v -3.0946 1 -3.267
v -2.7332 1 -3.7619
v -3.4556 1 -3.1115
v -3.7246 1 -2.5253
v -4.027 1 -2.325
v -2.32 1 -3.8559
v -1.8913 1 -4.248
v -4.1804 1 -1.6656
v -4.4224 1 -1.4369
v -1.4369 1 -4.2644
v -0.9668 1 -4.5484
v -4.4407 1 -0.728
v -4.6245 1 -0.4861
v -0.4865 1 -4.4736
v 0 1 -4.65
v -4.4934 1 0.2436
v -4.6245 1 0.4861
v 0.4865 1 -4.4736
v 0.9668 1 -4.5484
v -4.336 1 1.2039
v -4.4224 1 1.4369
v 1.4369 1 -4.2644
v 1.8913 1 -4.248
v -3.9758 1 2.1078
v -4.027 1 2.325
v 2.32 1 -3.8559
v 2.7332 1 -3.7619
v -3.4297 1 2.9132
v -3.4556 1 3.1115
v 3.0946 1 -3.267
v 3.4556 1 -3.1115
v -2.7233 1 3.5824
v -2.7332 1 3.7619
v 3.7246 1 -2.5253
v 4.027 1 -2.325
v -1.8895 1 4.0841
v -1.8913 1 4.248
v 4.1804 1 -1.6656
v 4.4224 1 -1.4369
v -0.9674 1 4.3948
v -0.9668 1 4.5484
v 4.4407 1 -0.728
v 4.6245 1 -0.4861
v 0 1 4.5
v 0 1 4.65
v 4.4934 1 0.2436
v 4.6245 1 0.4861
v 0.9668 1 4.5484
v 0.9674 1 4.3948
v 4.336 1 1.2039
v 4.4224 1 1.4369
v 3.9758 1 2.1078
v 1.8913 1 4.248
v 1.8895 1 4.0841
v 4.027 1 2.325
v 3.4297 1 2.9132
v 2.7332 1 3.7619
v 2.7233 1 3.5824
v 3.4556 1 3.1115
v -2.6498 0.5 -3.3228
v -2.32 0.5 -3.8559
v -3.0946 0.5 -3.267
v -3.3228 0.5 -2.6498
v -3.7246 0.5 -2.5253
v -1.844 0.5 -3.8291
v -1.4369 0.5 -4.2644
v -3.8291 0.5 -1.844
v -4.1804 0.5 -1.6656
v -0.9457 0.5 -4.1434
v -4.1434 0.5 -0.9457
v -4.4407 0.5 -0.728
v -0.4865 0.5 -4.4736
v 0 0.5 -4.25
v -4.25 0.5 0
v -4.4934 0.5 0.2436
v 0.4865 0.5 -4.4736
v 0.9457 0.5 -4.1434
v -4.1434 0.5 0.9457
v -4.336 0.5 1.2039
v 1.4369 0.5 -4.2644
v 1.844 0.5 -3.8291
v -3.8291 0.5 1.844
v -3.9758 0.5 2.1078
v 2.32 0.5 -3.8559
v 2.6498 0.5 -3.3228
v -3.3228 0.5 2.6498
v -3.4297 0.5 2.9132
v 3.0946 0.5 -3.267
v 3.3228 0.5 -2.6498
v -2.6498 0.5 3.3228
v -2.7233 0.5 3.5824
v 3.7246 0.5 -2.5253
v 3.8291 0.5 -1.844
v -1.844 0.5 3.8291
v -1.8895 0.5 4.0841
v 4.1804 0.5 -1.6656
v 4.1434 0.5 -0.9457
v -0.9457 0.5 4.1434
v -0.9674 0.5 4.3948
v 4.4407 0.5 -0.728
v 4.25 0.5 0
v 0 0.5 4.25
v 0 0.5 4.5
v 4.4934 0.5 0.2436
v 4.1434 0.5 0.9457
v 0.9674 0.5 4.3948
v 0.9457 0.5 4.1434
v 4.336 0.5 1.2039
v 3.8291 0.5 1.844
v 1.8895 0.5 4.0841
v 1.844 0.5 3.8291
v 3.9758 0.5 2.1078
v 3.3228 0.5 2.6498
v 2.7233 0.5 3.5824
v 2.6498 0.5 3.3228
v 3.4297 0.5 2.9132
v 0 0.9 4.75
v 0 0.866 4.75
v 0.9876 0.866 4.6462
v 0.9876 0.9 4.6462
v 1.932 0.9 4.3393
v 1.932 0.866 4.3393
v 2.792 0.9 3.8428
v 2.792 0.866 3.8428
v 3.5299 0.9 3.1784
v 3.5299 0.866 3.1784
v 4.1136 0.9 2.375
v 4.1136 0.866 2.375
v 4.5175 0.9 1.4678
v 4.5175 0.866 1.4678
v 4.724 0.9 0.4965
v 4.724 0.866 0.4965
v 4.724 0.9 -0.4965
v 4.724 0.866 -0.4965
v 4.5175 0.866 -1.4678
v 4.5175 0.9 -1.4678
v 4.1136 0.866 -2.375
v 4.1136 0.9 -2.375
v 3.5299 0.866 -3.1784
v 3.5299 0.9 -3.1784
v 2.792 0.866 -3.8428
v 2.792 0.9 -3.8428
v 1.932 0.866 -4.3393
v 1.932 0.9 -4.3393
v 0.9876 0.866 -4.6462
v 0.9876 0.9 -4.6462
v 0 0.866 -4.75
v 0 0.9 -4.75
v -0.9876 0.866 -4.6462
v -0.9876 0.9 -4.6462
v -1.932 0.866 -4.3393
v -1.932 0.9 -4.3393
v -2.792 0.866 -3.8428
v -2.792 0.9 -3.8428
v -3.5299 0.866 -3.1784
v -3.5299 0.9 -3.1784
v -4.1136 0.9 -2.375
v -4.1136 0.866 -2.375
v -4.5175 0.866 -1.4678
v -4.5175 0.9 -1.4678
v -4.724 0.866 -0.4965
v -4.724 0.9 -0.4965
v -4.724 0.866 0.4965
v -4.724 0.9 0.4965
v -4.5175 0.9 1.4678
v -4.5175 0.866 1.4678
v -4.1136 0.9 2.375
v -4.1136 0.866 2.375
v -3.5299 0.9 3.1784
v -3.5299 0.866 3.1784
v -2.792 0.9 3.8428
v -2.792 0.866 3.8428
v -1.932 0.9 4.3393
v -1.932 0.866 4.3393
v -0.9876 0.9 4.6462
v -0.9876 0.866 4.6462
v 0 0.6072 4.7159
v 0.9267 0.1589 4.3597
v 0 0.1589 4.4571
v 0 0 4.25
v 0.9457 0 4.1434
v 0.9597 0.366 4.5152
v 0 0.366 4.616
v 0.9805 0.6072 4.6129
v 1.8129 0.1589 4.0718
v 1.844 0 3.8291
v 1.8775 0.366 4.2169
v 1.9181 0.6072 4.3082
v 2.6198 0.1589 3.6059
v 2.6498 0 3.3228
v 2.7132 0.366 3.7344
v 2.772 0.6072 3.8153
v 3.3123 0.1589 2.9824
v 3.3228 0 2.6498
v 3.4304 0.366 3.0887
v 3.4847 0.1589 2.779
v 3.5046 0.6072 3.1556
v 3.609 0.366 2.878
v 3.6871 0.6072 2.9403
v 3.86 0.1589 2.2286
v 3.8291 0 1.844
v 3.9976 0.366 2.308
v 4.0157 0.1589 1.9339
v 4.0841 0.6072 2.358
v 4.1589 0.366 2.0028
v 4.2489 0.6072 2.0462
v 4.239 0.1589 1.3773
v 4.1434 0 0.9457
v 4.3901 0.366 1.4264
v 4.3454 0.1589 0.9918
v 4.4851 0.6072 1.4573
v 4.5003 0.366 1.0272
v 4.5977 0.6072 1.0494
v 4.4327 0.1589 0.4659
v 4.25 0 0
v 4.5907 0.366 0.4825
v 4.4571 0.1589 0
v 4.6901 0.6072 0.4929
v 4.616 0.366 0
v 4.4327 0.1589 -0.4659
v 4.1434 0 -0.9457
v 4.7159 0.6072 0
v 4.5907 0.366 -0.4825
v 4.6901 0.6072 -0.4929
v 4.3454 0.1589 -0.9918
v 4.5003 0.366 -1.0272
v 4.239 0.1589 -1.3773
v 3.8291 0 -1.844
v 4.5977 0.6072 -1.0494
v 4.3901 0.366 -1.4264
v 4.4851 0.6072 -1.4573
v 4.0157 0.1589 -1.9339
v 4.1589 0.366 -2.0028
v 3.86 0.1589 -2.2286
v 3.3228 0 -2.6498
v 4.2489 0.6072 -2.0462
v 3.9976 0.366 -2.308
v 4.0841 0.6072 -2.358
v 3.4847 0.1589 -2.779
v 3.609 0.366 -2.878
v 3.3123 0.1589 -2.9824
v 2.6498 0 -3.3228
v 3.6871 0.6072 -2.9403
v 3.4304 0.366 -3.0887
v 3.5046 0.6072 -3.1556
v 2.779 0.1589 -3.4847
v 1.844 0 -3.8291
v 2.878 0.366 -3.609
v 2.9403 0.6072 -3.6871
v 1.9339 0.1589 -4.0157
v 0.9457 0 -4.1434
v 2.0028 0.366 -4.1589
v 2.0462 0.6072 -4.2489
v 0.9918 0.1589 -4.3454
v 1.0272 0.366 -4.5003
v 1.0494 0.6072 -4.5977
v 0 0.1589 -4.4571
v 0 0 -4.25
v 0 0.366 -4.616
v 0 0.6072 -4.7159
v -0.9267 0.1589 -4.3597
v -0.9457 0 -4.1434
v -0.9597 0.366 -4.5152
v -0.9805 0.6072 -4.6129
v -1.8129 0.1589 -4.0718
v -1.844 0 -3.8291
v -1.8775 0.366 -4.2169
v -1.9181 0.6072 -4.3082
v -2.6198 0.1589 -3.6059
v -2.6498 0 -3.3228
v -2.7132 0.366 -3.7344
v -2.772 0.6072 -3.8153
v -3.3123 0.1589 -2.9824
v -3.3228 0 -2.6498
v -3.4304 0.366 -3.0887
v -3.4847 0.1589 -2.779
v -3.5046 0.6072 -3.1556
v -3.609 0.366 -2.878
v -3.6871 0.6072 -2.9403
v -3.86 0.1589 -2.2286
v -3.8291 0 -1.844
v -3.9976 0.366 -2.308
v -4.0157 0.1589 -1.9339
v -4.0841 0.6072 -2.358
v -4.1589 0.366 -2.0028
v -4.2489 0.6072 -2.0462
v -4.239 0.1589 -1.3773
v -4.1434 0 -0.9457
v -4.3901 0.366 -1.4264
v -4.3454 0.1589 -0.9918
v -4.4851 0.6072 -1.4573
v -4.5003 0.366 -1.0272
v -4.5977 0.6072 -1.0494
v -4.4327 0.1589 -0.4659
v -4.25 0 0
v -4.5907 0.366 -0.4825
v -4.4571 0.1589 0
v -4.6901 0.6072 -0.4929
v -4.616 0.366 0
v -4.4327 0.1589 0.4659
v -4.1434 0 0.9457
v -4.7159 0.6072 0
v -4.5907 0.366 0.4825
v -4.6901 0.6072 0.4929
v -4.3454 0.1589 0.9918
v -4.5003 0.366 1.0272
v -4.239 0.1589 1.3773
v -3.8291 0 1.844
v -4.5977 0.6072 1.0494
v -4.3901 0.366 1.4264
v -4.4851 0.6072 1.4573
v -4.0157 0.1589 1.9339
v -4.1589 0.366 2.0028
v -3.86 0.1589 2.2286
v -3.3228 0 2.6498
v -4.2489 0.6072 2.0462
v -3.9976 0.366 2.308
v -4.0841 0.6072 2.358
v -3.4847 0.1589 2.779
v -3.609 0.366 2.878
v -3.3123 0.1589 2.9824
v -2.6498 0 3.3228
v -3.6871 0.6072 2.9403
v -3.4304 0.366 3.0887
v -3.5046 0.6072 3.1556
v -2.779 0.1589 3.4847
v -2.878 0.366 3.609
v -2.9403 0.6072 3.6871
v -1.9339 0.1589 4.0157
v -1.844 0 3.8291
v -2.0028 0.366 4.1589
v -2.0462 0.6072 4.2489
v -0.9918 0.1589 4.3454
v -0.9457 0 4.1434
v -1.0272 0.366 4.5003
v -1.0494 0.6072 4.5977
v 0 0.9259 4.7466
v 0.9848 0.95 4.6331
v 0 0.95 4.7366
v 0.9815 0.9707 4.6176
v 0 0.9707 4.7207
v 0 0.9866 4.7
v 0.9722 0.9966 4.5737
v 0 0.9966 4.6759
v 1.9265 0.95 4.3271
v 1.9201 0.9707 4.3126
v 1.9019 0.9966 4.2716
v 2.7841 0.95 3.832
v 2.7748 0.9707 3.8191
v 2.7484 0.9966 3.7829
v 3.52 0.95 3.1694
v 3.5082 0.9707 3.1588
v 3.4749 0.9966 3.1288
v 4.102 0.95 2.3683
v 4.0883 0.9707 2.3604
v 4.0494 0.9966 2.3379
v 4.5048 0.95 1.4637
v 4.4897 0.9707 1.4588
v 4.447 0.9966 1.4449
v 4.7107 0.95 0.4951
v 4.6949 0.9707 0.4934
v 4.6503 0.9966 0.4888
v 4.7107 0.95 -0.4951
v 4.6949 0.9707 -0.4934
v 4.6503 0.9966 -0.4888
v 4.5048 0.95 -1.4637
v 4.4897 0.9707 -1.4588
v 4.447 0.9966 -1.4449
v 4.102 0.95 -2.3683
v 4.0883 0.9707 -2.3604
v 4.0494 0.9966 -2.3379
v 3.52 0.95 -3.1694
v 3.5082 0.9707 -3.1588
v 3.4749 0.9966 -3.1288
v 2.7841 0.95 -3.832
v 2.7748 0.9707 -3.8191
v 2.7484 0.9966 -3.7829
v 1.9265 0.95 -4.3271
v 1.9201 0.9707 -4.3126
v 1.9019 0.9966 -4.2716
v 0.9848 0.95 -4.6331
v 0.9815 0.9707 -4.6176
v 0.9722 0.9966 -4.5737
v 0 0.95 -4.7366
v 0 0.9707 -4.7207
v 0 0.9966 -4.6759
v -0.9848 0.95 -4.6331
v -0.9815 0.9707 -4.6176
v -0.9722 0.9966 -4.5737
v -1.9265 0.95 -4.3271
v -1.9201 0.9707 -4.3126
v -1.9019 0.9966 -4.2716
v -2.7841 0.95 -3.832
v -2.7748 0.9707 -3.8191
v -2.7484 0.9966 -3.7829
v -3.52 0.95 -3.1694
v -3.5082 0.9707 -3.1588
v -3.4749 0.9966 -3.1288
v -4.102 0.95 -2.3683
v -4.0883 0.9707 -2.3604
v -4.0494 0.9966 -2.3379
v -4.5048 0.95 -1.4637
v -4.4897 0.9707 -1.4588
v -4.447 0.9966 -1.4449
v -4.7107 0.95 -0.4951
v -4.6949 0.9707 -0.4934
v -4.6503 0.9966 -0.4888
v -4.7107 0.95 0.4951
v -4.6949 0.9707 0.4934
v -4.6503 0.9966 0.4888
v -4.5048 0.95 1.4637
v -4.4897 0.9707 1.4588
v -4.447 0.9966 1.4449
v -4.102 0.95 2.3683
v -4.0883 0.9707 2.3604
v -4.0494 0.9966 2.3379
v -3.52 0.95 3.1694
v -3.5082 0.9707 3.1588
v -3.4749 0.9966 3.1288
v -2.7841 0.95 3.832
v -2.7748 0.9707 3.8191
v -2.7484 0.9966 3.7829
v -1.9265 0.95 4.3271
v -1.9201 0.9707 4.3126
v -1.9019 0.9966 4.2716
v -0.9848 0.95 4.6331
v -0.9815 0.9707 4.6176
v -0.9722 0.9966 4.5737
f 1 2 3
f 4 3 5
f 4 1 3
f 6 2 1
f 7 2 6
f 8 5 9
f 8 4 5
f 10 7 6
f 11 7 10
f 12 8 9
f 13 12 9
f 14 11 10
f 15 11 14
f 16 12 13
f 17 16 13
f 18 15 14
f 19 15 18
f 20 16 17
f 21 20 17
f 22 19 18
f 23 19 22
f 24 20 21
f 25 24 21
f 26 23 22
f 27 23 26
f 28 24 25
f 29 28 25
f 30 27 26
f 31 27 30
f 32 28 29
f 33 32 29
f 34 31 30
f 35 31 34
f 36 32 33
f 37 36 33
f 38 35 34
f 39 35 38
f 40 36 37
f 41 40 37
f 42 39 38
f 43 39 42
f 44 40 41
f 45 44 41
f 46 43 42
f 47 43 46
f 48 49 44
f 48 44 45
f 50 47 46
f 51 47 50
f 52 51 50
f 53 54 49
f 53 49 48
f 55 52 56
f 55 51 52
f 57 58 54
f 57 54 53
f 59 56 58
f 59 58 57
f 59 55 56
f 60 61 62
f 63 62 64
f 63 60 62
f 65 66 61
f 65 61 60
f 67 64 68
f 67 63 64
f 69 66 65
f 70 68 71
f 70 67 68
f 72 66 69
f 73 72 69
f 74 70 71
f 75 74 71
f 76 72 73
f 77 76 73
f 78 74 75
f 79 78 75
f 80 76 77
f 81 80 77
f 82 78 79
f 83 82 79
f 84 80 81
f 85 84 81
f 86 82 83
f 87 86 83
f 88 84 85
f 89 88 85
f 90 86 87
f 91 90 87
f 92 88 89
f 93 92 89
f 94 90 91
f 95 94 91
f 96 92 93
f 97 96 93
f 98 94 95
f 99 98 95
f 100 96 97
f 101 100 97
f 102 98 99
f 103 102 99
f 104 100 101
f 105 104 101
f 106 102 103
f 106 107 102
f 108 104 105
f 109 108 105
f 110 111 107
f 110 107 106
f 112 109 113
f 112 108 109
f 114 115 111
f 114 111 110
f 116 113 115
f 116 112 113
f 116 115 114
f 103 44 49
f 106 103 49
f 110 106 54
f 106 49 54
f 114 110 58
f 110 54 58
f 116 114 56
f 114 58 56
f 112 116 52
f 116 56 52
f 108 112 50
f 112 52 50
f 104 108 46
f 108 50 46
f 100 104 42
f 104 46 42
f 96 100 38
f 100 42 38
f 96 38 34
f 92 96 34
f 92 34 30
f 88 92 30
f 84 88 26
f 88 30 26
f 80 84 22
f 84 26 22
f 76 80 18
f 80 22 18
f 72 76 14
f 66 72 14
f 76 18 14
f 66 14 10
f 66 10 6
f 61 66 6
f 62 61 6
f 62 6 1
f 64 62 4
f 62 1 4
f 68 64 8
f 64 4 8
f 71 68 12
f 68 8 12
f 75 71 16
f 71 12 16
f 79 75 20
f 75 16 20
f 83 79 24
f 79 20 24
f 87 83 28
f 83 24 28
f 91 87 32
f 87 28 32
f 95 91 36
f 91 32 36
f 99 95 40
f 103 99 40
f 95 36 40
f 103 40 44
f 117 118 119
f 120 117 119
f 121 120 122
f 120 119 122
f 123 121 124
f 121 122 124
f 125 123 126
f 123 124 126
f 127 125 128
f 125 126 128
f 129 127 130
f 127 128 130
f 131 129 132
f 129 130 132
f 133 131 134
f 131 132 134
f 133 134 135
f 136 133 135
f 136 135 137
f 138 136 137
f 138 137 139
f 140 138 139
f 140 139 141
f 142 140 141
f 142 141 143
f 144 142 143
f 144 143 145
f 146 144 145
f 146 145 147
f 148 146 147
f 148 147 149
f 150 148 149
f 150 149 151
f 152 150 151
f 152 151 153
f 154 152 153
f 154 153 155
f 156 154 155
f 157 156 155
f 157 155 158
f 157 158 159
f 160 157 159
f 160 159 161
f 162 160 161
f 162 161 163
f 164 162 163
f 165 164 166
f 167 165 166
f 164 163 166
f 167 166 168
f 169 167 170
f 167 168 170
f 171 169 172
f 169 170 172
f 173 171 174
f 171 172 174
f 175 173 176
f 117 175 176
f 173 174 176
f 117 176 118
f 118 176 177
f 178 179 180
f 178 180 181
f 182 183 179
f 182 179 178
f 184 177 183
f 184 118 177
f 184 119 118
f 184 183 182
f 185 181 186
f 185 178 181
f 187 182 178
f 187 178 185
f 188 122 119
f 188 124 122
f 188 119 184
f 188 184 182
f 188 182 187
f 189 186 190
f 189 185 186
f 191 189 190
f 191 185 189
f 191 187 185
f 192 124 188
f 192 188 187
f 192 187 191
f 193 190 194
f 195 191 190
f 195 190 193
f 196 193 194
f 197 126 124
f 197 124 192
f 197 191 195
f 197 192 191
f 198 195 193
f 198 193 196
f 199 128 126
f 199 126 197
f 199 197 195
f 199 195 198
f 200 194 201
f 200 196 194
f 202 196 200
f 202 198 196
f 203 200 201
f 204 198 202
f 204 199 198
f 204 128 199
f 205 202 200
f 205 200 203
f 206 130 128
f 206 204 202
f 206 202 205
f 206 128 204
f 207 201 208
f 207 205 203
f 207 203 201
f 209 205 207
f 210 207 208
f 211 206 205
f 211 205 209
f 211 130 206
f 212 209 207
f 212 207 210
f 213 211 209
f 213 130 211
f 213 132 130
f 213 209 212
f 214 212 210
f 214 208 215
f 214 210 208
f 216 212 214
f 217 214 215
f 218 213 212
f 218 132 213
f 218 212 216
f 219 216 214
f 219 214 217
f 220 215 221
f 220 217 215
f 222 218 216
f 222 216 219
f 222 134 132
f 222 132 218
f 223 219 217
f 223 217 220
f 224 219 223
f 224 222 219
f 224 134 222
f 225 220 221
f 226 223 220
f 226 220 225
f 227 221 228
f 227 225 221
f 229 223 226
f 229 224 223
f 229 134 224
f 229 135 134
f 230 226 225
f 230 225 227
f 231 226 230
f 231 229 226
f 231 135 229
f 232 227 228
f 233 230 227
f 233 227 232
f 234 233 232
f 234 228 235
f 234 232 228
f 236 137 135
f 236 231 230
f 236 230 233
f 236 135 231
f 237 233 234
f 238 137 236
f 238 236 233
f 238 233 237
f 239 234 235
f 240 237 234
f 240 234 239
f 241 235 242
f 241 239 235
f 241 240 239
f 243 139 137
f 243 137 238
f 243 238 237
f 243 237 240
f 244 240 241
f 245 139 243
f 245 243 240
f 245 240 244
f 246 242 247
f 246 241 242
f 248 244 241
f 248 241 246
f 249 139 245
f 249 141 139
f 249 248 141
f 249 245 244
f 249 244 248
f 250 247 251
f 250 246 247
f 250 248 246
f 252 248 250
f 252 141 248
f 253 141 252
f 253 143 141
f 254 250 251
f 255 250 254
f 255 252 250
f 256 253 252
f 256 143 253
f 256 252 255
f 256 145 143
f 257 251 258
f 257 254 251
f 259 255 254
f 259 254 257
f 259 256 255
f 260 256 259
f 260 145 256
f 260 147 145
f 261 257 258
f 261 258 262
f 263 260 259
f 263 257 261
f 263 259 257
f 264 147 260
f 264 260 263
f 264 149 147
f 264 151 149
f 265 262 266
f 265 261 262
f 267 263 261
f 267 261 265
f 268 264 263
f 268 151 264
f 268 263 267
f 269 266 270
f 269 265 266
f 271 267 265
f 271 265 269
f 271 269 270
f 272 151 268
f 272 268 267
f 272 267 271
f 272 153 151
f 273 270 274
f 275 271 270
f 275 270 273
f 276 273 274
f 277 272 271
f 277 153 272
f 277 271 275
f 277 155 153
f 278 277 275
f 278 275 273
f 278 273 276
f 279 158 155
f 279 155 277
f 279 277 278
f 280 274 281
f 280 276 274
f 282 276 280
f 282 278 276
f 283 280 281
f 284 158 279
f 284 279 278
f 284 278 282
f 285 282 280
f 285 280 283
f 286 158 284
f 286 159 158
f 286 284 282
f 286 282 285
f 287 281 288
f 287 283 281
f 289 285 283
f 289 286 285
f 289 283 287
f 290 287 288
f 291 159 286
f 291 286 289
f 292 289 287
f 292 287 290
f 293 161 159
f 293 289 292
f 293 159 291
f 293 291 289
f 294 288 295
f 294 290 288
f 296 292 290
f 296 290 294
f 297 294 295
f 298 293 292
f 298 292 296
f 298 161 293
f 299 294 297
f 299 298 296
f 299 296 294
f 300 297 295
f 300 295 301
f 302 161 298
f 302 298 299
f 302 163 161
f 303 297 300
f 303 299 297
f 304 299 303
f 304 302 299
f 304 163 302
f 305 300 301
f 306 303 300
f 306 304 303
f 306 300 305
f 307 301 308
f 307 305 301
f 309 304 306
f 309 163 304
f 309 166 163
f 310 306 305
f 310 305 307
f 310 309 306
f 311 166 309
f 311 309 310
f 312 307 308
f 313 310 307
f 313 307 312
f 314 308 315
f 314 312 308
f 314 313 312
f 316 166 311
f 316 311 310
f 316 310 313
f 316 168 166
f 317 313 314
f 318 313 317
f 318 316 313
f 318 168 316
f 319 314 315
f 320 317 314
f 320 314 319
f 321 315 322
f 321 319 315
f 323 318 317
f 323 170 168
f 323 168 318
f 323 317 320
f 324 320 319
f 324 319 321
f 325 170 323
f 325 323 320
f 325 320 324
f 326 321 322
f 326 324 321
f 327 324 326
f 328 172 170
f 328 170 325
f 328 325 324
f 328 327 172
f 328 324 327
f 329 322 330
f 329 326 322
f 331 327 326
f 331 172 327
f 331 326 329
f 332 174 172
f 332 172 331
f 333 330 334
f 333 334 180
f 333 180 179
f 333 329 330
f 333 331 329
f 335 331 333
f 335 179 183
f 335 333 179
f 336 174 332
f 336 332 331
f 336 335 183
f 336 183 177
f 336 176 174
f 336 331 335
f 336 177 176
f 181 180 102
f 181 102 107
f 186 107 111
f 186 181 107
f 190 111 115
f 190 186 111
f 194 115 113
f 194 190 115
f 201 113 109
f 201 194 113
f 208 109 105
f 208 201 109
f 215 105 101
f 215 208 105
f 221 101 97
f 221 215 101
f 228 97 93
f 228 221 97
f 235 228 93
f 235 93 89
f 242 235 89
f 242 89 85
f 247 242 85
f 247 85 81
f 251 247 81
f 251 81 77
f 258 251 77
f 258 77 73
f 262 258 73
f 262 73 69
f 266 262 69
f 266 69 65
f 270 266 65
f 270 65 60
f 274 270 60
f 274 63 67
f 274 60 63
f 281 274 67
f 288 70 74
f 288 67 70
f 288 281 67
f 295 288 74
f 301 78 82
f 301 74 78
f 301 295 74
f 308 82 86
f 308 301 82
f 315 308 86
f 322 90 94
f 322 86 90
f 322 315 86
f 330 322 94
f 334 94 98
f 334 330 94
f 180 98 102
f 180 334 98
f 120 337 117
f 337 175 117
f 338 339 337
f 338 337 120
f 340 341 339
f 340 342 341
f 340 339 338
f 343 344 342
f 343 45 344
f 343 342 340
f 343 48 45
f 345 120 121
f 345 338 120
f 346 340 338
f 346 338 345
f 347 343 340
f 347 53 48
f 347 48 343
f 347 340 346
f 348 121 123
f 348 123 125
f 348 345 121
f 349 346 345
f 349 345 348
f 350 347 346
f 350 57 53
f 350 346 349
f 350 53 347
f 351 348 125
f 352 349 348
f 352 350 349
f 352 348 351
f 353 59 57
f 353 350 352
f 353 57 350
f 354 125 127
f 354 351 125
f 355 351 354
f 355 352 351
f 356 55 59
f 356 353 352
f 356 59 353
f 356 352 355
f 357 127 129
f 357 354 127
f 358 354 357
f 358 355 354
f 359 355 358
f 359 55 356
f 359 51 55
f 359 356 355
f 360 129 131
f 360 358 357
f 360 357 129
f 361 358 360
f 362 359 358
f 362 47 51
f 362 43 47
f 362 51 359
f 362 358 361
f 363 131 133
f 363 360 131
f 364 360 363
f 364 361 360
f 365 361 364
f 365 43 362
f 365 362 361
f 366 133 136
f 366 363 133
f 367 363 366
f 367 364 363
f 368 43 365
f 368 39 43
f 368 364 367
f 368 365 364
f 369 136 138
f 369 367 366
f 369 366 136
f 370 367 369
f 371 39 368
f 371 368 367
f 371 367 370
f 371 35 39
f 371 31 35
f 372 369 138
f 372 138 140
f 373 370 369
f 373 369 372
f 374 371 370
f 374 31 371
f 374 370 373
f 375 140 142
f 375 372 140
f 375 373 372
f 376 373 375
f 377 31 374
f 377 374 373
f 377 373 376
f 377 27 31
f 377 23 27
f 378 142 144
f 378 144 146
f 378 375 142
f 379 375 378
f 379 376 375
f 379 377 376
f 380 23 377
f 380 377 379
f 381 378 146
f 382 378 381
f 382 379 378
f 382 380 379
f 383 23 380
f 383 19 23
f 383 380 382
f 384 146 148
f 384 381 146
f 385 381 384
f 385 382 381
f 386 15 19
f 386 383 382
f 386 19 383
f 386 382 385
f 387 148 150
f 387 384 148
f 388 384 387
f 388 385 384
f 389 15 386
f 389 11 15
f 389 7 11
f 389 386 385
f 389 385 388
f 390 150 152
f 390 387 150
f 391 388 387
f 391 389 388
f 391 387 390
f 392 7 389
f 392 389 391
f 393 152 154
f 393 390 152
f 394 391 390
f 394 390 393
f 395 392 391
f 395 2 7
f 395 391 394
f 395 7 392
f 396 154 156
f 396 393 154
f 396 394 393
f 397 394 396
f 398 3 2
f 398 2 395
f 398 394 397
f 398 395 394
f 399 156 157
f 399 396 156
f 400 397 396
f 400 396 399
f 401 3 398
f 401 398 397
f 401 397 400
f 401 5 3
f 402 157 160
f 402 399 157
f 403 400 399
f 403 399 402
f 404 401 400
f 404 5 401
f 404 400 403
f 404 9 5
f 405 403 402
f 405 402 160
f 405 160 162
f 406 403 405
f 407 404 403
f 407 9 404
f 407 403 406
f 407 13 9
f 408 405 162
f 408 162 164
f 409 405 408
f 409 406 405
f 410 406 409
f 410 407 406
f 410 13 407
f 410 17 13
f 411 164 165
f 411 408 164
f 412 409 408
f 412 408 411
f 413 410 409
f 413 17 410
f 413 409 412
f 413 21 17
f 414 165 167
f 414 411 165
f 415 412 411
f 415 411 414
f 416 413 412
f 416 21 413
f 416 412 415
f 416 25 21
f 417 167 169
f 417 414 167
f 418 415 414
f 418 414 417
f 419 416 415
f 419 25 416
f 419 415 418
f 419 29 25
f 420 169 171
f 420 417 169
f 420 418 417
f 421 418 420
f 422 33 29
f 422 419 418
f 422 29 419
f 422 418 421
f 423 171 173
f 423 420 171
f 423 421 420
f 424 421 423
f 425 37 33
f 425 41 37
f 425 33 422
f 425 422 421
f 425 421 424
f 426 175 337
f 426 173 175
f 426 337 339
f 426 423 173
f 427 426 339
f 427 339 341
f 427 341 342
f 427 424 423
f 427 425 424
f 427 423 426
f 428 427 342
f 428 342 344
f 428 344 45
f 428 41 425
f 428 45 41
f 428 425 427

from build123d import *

# Parameters (mm, degrees)
SKETCH1_R           = 4.75
SKETCH1_R_2         = 4.25
BOSS_EXTRUDE1_DEPTH = 1
SKETCH2_R           = 4.5
CUT_EXTRUDE1_DEPTH  = 0.5
FILLET1_R           = 1
FILLET2_R           = 0.1


with BuildPart() as part:
    # Sketch1 → Boss-Extrude1 (new body)
    with BuildSketch(Plane(origin=(0, 0, 0), x_dir=(1, 0, 0), z_dir=(0, 1, 0))):
        with Locations(Location((0, 0, 0), (0, 0, 270))):
            Circle(SKETCH1_R)
        with Locations(Location((0, 0, 0), (0, 0, 270))):
            Circle(SKETCH1_R_2, mode=Mode.SUBTRACT)
    extrude(amount=BOSS_EXTRUDE1_DEPTH)

    # Sketch2 → Cut-Extrude1 (cut)
    with BuildSketch(Plane(origin=(0, 1, 0), x_dir=(1, 0, 0), z_dir=(0, 1, 0))):
        with Locations(Location((0, 0, 0), (0, 0, 270))):
            Circle(SKETCH2_R)
    extrude(amount=-CUT_EXTRUDE1_DEPTH, mode=Mode.SUBTRACT)

    # Fillet1
    # the kernel refuses this fillet: 1 mm, written as the material it takes off along each edge
    with BuildSketch(Plane(origin=(0, 0, 0), x_dir=(0, 0, 1), z_dir=(-1, 0, 0))) as fillet1_piece_1:
        with BuildLine():
            CenterArc((3.75, 0.866025404), FILLET1_R, 300, 60)
            Line((4.25, 0), (4.26, -0.017320508))
            ThreePointArc((4.26, -0.017320508), (4.5, -0.02), (4.75, -0.02))
            Line((4.75, -0.02), (4.77, 0))
            Line((4.77, 0), (4.77, 0.866025404))
            Line((4.77, 0.866025404), (4.75, 0.866025404))
        make_face()
    revolve(axis=Axis((0, 0, 0), (0, 1, 0)), mode=Mode.SUBTRACT)

    # Fillet2
    fillet2_edges = [part.edges().sort_by_distance(p)[0] for p in [
        (0, 1, -4.75),
    ]]
    fillet(fillet2_edges, radius=FILLET2_R)


solid = part.part
